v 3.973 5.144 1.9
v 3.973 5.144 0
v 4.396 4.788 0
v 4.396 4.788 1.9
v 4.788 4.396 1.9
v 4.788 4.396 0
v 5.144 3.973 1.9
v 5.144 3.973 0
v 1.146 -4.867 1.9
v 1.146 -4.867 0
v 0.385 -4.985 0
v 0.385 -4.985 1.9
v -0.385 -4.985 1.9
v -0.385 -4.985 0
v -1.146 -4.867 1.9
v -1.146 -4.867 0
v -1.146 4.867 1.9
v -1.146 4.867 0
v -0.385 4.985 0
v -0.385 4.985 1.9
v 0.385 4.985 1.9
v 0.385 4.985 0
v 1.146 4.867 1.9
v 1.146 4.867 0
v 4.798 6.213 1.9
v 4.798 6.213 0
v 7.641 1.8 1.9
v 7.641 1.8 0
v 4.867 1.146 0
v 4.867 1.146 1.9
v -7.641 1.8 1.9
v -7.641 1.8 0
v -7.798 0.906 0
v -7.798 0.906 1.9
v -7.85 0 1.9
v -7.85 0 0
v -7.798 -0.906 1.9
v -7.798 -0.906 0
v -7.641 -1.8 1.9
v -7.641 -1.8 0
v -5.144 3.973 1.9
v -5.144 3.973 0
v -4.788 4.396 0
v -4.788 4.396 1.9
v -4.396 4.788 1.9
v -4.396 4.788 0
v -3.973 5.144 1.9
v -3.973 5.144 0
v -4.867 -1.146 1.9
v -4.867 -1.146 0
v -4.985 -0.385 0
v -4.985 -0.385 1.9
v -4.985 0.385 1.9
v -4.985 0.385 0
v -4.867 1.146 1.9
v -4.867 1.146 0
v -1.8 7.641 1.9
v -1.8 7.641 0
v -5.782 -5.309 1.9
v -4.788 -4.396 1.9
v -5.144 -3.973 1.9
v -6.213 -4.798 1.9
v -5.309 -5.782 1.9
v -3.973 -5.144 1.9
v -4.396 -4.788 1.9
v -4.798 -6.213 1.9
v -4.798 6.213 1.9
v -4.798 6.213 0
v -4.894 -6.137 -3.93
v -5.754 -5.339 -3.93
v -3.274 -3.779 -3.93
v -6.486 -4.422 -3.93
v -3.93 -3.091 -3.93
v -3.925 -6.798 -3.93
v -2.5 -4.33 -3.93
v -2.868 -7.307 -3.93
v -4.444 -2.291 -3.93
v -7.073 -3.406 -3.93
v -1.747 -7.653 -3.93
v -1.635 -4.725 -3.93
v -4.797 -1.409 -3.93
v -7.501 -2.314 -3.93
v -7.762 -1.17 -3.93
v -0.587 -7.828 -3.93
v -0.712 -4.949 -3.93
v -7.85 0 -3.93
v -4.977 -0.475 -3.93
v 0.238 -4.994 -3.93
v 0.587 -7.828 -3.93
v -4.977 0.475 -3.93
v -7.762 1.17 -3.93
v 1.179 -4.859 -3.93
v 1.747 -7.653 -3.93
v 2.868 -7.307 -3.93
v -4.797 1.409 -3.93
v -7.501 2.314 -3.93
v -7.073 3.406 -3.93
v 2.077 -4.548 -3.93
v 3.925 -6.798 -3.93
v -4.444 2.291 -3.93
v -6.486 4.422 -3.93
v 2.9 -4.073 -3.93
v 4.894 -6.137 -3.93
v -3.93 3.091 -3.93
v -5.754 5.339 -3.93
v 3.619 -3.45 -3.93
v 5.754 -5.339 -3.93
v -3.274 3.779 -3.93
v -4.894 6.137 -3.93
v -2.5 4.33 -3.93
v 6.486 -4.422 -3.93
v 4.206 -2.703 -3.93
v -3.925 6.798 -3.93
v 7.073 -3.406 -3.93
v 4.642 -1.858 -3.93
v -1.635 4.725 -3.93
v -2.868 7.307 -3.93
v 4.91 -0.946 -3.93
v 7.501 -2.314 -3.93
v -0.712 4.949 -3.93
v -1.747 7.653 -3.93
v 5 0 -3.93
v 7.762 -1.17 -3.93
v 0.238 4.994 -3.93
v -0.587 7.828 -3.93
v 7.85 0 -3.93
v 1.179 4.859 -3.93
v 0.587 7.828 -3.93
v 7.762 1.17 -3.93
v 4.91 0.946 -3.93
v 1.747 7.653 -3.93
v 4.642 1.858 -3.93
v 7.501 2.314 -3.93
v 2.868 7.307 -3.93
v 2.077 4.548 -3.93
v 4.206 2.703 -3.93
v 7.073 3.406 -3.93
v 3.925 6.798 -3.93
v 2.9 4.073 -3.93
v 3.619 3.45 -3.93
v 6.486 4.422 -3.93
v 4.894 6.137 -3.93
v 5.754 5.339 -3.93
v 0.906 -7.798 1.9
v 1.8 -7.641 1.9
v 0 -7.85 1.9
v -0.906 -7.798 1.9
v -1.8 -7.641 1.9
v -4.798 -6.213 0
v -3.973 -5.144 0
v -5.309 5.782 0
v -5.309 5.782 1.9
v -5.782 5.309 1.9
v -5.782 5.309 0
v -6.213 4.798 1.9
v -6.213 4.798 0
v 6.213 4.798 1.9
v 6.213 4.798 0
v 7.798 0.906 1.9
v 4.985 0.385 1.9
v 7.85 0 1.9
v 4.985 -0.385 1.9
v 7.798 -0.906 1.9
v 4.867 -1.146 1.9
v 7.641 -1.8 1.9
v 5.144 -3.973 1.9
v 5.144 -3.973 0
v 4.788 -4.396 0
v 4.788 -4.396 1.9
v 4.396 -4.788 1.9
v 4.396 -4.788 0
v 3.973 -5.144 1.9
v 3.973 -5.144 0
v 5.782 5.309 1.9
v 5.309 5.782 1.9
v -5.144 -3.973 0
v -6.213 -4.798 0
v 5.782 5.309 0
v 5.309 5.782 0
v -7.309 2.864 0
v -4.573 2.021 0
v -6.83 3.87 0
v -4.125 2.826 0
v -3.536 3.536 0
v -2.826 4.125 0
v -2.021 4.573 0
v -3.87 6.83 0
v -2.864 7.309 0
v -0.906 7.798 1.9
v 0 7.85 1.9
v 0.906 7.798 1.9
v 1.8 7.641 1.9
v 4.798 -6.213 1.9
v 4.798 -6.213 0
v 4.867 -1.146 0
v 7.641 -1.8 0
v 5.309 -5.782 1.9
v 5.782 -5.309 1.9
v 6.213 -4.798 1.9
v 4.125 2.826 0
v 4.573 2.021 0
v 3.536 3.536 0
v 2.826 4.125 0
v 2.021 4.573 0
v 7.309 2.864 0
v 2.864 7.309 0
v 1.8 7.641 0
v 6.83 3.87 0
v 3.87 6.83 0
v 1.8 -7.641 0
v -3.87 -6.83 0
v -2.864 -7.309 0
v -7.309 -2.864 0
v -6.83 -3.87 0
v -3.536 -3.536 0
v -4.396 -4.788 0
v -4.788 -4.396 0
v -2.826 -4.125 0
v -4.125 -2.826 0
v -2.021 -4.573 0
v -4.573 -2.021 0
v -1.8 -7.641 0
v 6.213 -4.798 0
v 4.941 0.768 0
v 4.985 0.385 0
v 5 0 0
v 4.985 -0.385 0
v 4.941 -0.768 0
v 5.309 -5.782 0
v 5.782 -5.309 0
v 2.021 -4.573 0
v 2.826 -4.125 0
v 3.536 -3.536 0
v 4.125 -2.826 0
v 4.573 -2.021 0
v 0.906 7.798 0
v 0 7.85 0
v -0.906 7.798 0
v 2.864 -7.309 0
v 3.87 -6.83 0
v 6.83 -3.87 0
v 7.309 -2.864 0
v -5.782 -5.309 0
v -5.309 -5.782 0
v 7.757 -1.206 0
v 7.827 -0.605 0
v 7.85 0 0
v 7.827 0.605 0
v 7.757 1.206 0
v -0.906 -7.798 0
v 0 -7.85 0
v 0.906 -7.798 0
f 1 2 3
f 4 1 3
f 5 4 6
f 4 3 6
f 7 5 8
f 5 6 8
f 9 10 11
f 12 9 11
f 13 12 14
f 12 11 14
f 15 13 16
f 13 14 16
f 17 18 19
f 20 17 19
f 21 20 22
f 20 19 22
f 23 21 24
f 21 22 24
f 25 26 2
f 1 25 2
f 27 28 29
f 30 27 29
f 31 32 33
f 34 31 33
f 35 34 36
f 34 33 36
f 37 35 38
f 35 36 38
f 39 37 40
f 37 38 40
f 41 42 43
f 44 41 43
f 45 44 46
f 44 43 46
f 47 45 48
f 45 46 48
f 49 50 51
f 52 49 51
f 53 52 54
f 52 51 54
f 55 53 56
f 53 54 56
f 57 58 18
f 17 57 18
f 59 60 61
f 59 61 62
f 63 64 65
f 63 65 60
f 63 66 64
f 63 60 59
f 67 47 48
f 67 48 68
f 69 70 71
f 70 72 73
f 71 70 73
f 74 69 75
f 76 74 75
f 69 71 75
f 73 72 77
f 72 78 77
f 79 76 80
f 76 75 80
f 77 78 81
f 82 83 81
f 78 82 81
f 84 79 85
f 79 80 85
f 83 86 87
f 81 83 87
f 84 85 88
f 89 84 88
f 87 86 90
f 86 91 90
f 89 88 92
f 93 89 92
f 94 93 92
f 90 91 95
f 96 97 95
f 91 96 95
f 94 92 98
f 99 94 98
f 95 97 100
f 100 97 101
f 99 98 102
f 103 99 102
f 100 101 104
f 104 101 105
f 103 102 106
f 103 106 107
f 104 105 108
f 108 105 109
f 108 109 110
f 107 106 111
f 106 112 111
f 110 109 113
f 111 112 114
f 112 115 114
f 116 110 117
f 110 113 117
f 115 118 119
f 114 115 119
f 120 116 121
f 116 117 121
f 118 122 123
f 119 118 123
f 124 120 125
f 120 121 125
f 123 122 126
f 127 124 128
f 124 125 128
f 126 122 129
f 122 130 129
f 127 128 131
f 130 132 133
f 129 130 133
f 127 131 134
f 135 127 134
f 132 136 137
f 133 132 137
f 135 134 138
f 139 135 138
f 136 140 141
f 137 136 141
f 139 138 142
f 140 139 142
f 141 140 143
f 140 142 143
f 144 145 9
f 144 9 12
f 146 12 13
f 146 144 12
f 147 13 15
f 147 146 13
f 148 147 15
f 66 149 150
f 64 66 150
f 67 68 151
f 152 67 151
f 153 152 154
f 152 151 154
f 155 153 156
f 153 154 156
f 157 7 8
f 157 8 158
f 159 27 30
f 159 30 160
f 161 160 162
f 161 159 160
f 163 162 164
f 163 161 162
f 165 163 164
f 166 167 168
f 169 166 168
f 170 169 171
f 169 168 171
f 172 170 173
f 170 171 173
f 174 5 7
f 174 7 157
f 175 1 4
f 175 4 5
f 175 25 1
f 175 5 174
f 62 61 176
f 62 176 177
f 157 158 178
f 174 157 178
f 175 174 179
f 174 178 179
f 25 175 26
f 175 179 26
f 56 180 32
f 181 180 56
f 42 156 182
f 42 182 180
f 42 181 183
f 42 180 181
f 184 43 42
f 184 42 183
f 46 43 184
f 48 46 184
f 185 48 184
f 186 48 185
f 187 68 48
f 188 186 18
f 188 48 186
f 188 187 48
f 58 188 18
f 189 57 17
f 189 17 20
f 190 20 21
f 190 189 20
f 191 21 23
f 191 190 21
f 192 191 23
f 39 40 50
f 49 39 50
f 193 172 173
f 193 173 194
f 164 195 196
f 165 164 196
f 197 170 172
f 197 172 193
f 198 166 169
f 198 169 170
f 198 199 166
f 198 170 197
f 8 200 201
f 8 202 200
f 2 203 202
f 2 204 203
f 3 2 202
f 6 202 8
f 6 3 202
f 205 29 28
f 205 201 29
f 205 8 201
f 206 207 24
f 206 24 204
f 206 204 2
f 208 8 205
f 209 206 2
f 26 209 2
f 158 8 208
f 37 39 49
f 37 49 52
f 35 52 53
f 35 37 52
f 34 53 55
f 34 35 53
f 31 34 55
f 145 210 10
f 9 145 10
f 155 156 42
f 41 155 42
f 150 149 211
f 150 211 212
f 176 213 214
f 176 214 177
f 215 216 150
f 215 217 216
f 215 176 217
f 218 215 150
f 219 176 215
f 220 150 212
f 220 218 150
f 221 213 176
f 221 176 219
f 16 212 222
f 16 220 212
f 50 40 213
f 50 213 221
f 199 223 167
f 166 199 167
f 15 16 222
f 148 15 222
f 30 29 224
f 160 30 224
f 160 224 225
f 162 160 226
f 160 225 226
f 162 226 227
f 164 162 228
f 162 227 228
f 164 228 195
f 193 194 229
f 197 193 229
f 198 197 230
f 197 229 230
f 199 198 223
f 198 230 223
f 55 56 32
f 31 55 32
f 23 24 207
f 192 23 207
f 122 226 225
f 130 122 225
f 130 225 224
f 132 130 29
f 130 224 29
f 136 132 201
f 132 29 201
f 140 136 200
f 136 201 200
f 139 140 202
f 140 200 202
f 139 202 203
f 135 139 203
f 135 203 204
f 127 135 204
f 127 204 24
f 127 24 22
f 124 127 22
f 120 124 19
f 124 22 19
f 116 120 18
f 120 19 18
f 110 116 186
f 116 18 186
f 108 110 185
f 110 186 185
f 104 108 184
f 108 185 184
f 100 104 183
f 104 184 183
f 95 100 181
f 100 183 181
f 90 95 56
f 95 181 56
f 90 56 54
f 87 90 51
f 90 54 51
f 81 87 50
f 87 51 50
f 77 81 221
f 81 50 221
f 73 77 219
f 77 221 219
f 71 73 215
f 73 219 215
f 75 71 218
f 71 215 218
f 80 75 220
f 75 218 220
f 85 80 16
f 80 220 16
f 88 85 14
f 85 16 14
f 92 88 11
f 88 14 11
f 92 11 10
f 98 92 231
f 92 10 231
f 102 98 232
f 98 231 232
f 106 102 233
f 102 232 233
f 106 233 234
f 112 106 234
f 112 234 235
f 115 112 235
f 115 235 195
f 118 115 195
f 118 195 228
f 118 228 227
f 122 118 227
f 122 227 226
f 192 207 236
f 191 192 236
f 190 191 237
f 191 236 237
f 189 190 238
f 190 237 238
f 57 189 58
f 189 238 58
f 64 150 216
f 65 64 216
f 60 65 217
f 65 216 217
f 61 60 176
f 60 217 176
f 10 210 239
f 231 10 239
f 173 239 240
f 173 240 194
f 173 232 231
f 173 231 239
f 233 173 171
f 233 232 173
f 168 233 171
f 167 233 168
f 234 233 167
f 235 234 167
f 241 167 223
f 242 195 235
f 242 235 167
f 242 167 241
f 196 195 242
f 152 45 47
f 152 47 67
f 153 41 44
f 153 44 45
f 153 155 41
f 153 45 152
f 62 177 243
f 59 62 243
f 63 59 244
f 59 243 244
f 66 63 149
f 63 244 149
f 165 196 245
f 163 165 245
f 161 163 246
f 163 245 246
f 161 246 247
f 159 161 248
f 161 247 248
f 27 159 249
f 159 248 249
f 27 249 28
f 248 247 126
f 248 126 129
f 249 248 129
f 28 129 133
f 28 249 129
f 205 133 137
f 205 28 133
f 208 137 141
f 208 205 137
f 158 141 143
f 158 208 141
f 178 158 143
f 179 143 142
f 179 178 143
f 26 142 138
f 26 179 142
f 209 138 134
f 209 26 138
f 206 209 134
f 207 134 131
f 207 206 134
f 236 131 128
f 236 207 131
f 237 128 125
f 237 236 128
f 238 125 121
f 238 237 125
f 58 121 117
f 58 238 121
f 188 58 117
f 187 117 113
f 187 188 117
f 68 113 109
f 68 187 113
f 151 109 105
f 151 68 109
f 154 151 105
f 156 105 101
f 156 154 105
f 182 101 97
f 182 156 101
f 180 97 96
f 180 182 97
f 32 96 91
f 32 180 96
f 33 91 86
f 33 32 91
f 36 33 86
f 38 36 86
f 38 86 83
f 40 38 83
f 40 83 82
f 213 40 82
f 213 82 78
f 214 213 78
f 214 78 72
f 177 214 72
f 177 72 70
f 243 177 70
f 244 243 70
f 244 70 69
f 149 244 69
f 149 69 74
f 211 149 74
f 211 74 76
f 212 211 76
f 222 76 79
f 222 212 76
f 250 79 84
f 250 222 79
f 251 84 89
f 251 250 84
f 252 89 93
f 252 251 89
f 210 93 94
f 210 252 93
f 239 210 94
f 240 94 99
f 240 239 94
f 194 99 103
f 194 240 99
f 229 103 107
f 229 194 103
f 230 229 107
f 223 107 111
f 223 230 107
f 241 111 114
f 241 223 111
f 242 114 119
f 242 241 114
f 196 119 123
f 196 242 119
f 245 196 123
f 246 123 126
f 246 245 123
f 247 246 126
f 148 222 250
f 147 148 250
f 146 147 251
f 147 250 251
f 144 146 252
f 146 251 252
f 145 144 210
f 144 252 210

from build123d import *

# Parameters (mm, degrees)
F1_DEPTH = 1.9
F2_DEPTH = 1.9
F3_COUNT = 4
F4_R     = 7.85
F4_R_2   = 5
F6_DEPTH = 3.93


with BuildPart() as f1:
    # F0 (on Top) → F1 (new body)
    with BuildSketch(Plane.XY):
        with BuildLine():
            Line((1.146497, 4.86678), (1.8, 7.640844))
            ThreePointArc((1.8, 7.640844), (0, 7.85), (-1.8, 7.640844))
            Line((-1.8, 7.640844), (-1.146497, 4.86678))
            ThreePointArc((-1.146497, 4.86678), (0, 5), (1.146497, 4.86678))
        make_face()
    extrude(amount=F1_DEPTH)



with BuildPart() as f2:
    # F0 (on Top) → F2 (new body, through all)
    with BuildSketch(Plane.XY):
        with BuildLine():
            ThreePointArc((3.973246, 5.144251), (4.596194, 4.596194), (5.144251, 3.973246))
            Line((5.144251, 3.973246), (6.212672, 4.798459))
            ThreePointArc((6.212672, 4.798459), (5.550788, 5.550788), (4.798459, 6.212672))
            Line((4.798459, 6.212672), (3.973246, 5.144251))
        make_face()
    extrude(amount=F2_DEPTH)


with BuildPart() as f3_1:
    # F3: instance of F1
    add(f1.part.rotate(Axis((0, 0, 0), (0, 0, -1)), 1 * 360 / F3_COUNT))


with BuildPart() as f3_2:
    # F3: instance of F1
    add(f1.part.rotate(Axis((0, 0, 0), (0, 0, -1)), 2 * 360 / F3_COUNT))


with BuildPart() as f3_3:
    # F3: instance of F1
    add(f1.part.rotate(Axis((0, 0, 0), (0, 0, -1)), 3 * 360 / F3_COUNT))


with BuildPart() as f3_4:
    # F3: instance of F2
    add(f2.part.rotate(Axis((0, 0, 0), (0, 0, -1)), 1 * 360 / F3_COUNT))


with BuildPart() as f3_5:
    # F3: instance of F2
    add(f2.part.rotate(Axis((0, 0, 0), (0, 0, -1)), 2 * 360 / F3_COUNT))


with BuildPart() as f3_6:
    # F3: instance of F2
    add(f2.part.rotate(Axis((0, 0, 0), (0, 0, -1)), 3 * 360 / F3_COUNT))


with BuildPart() as f1_1:
    add(f1.part)

    add(f2.part)  # F6 merges F2

    add(f3_1.part)  # F6 merges F3_1

    add(f3_2.part)  # F6 merges F3_2

    add(f3_3.part)  # F6 merges F3_3

    add(f3_4.part)  # F6 merges F3_4

    add(f3_5.part)  # F6 merges F3_5

    add(f3_6.part)  # F6 merges F3_6
    # F4 (on Top) → F6 (join)
    with BuildSketch(Plane.XY):
        Circle(F4_R)
        Circle(F4_R_2, mode=Mode.SUBTRACT)
    extrude(amount=-F6_DEPTH)


solid = f1_1.part
